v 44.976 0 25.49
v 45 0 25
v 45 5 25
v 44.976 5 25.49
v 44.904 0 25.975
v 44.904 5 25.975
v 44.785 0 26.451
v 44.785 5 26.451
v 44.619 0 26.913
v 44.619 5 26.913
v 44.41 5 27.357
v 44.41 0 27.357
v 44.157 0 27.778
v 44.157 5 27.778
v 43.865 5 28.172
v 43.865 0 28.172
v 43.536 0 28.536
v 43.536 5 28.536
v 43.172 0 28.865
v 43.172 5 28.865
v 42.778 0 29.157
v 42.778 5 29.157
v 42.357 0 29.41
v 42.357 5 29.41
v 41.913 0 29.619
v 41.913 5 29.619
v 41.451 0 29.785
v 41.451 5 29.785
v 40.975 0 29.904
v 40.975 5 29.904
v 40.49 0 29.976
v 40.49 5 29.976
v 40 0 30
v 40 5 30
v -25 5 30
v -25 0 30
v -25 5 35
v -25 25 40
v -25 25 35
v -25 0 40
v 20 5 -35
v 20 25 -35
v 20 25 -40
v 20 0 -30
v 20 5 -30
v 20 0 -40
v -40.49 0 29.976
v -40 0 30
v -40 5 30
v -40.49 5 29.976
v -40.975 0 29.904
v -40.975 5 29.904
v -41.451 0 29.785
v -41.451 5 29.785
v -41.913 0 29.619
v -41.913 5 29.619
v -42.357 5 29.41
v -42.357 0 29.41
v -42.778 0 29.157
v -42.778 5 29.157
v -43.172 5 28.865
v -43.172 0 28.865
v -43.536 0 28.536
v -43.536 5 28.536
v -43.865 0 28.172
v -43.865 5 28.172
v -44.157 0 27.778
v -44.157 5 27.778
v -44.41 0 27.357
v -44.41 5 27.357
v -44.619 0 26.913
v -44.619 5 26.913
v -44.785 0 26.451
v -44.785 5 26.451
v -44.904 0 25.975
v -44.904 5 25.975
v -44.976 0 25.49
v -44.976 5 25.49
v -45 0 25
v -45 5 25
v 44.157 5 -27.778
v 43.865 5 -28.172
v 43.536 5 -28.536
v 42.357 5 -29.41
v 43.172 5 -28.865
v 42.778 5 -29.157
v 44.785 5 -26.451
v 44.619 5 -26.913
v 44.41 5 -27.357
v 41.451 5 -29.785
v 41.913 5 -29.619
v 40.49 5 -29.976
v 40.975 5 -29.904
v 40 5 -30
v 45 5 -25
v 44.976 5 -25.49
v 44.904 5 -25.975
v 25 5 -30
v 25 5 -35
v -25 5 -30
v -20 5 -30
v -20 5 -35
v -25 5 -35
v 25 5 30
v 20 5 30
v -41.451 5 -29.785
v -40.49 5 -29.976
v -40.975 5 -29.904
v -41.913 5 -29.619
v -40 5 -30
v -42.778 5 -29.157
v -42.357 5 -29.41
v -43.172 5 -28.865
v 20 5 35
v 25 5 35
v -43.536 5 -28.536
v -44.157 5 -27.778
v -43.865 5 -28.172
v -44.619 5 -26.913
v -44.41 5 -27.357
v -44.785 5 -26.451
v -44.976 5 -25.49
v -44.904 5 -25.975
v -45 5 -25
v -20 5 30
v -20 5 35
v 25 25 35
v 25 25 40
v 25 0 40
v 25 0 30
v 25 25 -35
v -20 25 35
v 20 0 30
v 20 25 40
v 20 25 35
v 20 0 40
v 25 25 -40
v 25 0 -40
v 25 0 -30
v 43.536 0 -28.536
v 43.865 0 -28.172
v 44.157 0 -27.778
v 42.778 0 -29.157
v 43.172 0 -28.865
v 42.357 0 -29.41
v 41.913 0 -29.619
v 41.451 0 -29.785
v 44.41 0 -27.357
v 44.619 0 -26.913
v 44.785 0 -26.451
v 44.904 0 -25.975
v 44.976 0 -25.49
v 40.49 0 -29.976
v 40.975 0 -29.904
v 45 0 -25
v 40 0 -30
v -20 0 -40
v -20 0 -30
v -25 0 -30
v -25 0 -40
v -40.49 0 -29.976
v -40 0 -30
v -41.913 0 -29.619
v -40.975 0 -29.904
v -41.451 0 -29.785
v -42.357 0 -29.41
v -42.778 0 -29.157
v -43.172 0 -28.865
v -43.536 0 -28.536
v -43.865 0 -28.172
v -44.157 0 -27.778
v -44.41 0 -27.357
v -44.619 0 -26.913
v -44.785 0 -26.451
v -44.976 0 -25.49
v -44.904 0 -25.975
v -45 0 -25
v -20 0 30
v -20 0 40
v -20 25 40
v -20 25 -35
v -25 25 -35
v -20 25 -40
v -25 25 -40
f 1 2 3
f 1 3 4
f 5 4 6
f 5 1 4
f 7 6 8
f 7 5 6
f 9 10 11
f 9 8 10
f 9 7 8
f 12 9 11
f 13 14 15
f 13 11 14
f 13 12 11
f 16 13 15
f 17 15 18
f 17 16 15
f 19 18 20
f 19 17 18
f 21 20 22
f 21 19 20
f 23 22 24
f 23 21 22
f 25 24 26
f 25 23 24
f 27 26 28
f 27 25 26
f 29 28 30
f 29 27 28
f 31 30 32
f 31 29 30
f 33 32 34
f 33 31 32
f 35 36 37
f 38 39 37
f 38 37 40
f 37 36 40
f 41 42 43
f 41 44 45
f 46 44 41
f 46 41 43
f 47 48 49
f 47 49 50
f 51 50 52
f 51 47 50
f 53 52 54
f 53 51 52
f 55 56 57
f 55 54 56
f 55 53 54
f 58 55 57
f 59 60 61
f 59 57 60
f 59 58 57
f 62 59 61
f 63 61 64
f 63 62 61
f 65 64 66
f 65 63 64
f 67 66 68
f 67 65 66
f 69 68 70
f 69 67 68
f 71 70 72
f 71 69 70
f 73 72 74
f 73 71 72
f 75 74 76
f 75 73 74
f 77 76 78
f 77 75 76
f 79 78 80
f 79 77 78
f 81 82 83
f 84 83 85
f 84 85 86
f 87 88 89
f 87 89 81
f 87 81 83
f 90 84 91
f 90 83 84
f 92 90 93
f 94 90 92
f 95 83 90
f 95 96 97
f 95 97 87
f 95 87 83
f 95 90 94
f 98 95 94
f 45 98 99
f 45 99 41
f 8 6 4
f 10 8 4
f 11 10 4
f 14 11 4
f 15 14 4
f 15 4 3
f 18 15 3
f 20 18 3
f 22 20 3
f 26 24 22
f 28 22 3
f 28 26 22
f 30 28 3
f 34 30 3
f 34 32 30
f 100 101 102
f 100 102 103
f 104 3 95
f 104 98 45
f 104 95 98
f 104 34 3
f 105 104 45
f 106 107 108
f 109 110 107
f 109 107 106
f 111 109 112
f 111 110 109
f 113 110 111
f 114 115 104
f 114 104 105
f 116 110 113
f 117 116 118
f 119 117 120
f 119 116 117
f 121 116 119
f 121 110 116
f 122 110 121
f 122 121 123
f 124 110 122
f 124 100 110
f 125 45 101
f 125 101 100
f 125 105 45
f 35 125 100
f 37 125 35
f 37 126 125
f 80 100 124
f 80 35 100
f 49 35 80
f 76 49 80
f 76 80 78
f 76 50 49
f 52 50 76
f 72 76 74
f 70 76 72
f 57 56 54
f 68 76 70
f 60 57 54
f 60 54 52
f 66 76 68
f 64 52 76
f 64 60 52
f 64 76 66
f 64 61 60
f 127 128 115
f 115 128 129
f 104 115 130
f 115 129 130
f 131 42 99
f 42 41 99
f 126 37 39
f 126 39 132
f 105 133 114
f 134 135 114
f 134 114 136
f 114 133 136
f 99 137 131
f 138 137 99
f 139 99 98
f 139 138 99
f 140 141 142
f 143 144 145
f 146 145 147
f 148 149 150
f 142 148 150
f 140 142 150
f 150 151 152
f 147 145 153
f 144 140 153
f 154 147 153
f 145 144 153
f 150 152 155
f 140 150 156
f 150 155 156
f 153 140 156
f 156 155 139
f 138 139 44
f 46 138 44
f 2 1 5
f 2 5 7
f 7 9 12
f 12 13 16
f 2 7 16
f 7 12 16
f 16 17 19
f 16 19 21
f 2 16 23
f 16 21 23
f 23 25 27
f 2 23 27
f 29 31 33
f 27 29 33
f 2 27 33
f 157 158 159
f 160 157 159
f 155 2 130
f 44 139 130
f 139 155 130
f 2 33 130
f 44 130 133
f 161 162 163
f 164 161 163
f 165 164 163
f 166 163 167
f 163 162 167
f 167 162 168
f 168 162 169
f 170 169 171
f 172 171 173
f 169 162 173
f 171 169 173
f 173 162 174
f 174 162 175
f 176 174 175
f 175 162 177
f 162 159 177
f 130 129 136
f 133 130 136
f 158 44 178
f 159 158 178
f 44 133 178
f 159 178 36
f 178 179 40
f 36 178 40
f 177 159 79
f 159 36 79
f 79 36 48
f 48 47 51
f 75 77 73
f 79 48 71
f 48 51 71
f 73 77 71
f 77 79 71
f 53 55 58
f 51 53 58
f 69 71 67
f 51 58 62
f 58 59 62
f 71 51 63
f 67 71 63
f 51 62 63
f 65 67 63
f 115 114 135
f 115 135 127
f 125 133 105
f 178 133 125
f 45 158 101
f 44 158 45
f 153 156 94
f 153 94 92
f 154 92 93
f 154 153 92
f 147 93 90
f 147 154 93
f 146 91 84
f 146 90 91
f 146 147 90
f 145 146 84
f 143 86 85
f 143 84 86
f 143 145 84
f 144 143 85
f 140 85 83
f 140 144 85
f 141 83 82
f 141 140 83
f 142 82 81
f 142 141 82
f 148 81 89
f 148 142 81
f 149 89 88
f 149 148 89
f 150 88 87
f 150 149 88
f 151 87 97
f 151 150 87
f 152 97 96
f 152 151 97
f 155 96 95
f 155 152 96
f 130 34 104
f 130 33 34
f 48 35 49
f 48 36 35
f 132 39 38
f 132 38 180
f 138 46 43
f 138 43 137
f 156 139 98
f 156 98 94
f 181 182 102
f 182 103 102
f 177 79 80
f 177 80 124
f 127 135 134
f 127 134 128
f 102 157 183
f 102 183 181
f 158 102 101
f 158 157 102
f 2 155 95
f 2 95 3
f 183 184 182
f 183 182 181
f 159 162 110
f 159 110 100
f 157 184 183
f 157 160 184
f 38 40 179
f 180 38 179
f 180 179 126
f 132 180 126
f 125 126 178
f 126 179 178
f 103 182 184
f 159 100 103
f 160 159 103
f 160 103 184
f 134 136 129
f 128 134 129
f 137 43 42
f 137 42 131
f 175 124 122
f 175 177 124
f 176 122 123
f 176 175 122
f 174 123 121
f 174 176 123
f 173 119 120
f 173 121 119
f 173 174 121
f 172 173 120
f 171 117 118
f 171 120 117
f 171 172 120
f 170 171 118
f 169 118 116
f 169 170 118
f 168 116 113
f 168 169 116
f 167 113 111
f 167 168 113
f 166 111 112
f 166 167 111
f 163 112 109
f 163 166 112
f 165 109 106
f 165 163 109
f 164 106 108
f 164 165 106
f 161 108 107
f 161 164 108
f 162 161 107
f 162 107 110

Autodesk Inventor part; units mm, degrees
ref_plane "YZ Plane" through (0, 0, 0) normal (1, 0, 0) x (0, 1, 0)
ref_plane "XZ Plane" through (0, 0, 0) normal (0, 1, 0) x (-1, 0, 0)
ref_plane "XY Plane" through (0, 0, 0) normal (0, 0, 1) x (1, 0, 0)
sketch "Szkic1" plane through (0, 0, 0) normal (0, 1, 0) x (-1, 0, 0)
  line L0 (40, -30) -> (25, -30)
  line L1 (-45, -25) -> (-45, 25)
  line L2 (-40, 30) -> (-25, 30)
  line L3 (45, 25) -> (45, -25)
  arc A0 (45, 25) -> (40, 30) centre (40, 25) ccw
  arc A1 (40, -30) -> (45, -25) centre (40, -25) ccw
  arc A2 (-45, -25) -> (-40, -30) centre (-40, -25) ccw
  arc A3 (-40, 30) -> (-45, 25) centre (-40, 25) ccw
  line L4 (40, 30) -> (35, 30)
  line L5 (20, 30) -> (20, 25)
  line L6 (20, 25) -> (25, 25)
  line L7 (25, 25) -> (25, 30)
  line L8 (2.5, 30) -> (-2.5, 30)
  line L9 (-25, 30) -> (-25, 25)
  line L10 (-25, 25) -> (-20, 25)
  line L11 (-20, 25) -> (-20, 30)
  line L12 (-35, 30) -> (-40, 30)
  line L13 (35, -30) -> (40, -30)
  line L14 (25, -25) -> (20, -25)
  line L15 (20, -25) -> (20, -30)
  line L16 (25, -30) -> (25, -25)
  line L17 (-2.5, -30) -> (2.5, -30)
  line L18 (-20, -25) -> (-25, -25)
  line L19 (-25, -25) -> (-25, -30)
  line L20 (-20, -30) -> (-20, -25)
  line L21 (-40, -30) -> (-35, -30)
  line L22 (20, -30) -> (-20, -30)
  line L23 (-25, -30) -> (-40, -30)
  line L24 (-20, 30) -> (20, 30)
  line L25 (25, 30) -> (40, 30)
  point P0 (0, 0)
  point P1 (40, -30)
  dimension "d2" = 5
  dimension "d5" = 5
  dimension "d6" = 5
  dimension "d9" = 5
  dimension "d12" = 5
  dimension "d13" = 5
  dimension "d15" = 5
  dimension "d17" = 5
  dimension "d19" = 5
  dimension "d21" = 5
ref_plane "Płaszczyzna konstrukcyjna2" through (0, 0, 0) normal (0, -1, 0) x (1, 0, 0)
sketch "Szkic5" plane through (0, 0, 0) normal (0, -1, 0) x (1, 0, 0)
  line L0 (25, 25) -> (20, 25)
  line L1 (20, 25) -> (20, 40)
  line L2 (20, 40) -> (25, 40)
  line L3 (25, 40) -> (25, 25)
  line L4 (-20, 25) -> (-25, 25)
  line L5 (-25, 25) -> (-25, 40)
  line L6 (-25, 40) -> (-20, 40)
  line L7 (-20, 40) -> (-20, 25)
  line L8 (25, -25) -> (20, -25)
  line L9 (20, -25) -> (20, -40)
  line L10 (20, -40) -> (25, -40)
  line L11 (25, -40) -> (25, -25)
  line L12 (-20, -25) -> (-25, -25)
  line L13 (-25, -25) -> (-25, -40)
  line L14 (-25, -40) -> (-20, -40)
  line L15 (-20, -40) -> (-20, -25)
  point P0 (0, 0)
  dimension "d56" = 5
  dimension "d57" = 15
  dimension "d58" = 5
  dimension "d59" = 15
  dimension "d60" = 5
  dimension "d61" = 15
  dimension "d62" = 5
  dimension "d63" = 15
extrude "Wyciągnięcie proste5" add sketch "Szkic5" against normal blind 5
ref_plane "Płaszczyzna konstrukcyjna3" through (0, 5, 0) normal (0, 1, 0) x (1, 0, 0)
sketch "Szkic6" plane through (0, 5, 0) normal (0, 1, 0) x (1, 0, 0)
  line L0 (25, -40) -> (20, -40)
  line L1 (20, -40) -> (20, -35)
  line L2 (20, -35) -> (25, -35)
  line L3 (25, -35) -> (25, -40)
  line L4 (-20, -40) -> (-25, -40)
  line L5 (-25, -40) -> (-25, -35)
  line L6 (-25, -35) -> (-20, -35)
  line L7 (-20, -35) -> (-20, -40)
  line L8 (25, 40) -> (20, 40)
  line L9 (20, 40) -> (20, 35)
  line L10 (20, 35) -> (25, 35)
  line L11 (25, 35) -> (25, 40)
  line L12 (-20, 40) -> (-25, 40)
  line L13 (-25, 40) -> (-25, 35)
  line L14 (-25, 35) -> (-20, 35)
  line L15 (-20, 35) -> (-20, 40)
  point P0 (0, 0)
  dimension "d64" = 5
  dimension "d66" = 5
  dimension "d67" = 5
  dimension "d68" = 5
  dimension "d69" = 5
  dimension "d70" = 5
  dimension "d71" = 5
  dimension "d72" = 5
  dimension "d73" = 5
extrude "Wyciągnięcie proste6" add sketch "Szkic6" along normal blind 20
extrude "Wyciągnięcie proste7" add sketch "Szkic1" along normal blind 5
sketch "Szkic7" plane through (0, 0, 0) normal (0, -1, 0) x (1, 0, 0)
  point P0 (0, 0)
properties part number "Floor"
